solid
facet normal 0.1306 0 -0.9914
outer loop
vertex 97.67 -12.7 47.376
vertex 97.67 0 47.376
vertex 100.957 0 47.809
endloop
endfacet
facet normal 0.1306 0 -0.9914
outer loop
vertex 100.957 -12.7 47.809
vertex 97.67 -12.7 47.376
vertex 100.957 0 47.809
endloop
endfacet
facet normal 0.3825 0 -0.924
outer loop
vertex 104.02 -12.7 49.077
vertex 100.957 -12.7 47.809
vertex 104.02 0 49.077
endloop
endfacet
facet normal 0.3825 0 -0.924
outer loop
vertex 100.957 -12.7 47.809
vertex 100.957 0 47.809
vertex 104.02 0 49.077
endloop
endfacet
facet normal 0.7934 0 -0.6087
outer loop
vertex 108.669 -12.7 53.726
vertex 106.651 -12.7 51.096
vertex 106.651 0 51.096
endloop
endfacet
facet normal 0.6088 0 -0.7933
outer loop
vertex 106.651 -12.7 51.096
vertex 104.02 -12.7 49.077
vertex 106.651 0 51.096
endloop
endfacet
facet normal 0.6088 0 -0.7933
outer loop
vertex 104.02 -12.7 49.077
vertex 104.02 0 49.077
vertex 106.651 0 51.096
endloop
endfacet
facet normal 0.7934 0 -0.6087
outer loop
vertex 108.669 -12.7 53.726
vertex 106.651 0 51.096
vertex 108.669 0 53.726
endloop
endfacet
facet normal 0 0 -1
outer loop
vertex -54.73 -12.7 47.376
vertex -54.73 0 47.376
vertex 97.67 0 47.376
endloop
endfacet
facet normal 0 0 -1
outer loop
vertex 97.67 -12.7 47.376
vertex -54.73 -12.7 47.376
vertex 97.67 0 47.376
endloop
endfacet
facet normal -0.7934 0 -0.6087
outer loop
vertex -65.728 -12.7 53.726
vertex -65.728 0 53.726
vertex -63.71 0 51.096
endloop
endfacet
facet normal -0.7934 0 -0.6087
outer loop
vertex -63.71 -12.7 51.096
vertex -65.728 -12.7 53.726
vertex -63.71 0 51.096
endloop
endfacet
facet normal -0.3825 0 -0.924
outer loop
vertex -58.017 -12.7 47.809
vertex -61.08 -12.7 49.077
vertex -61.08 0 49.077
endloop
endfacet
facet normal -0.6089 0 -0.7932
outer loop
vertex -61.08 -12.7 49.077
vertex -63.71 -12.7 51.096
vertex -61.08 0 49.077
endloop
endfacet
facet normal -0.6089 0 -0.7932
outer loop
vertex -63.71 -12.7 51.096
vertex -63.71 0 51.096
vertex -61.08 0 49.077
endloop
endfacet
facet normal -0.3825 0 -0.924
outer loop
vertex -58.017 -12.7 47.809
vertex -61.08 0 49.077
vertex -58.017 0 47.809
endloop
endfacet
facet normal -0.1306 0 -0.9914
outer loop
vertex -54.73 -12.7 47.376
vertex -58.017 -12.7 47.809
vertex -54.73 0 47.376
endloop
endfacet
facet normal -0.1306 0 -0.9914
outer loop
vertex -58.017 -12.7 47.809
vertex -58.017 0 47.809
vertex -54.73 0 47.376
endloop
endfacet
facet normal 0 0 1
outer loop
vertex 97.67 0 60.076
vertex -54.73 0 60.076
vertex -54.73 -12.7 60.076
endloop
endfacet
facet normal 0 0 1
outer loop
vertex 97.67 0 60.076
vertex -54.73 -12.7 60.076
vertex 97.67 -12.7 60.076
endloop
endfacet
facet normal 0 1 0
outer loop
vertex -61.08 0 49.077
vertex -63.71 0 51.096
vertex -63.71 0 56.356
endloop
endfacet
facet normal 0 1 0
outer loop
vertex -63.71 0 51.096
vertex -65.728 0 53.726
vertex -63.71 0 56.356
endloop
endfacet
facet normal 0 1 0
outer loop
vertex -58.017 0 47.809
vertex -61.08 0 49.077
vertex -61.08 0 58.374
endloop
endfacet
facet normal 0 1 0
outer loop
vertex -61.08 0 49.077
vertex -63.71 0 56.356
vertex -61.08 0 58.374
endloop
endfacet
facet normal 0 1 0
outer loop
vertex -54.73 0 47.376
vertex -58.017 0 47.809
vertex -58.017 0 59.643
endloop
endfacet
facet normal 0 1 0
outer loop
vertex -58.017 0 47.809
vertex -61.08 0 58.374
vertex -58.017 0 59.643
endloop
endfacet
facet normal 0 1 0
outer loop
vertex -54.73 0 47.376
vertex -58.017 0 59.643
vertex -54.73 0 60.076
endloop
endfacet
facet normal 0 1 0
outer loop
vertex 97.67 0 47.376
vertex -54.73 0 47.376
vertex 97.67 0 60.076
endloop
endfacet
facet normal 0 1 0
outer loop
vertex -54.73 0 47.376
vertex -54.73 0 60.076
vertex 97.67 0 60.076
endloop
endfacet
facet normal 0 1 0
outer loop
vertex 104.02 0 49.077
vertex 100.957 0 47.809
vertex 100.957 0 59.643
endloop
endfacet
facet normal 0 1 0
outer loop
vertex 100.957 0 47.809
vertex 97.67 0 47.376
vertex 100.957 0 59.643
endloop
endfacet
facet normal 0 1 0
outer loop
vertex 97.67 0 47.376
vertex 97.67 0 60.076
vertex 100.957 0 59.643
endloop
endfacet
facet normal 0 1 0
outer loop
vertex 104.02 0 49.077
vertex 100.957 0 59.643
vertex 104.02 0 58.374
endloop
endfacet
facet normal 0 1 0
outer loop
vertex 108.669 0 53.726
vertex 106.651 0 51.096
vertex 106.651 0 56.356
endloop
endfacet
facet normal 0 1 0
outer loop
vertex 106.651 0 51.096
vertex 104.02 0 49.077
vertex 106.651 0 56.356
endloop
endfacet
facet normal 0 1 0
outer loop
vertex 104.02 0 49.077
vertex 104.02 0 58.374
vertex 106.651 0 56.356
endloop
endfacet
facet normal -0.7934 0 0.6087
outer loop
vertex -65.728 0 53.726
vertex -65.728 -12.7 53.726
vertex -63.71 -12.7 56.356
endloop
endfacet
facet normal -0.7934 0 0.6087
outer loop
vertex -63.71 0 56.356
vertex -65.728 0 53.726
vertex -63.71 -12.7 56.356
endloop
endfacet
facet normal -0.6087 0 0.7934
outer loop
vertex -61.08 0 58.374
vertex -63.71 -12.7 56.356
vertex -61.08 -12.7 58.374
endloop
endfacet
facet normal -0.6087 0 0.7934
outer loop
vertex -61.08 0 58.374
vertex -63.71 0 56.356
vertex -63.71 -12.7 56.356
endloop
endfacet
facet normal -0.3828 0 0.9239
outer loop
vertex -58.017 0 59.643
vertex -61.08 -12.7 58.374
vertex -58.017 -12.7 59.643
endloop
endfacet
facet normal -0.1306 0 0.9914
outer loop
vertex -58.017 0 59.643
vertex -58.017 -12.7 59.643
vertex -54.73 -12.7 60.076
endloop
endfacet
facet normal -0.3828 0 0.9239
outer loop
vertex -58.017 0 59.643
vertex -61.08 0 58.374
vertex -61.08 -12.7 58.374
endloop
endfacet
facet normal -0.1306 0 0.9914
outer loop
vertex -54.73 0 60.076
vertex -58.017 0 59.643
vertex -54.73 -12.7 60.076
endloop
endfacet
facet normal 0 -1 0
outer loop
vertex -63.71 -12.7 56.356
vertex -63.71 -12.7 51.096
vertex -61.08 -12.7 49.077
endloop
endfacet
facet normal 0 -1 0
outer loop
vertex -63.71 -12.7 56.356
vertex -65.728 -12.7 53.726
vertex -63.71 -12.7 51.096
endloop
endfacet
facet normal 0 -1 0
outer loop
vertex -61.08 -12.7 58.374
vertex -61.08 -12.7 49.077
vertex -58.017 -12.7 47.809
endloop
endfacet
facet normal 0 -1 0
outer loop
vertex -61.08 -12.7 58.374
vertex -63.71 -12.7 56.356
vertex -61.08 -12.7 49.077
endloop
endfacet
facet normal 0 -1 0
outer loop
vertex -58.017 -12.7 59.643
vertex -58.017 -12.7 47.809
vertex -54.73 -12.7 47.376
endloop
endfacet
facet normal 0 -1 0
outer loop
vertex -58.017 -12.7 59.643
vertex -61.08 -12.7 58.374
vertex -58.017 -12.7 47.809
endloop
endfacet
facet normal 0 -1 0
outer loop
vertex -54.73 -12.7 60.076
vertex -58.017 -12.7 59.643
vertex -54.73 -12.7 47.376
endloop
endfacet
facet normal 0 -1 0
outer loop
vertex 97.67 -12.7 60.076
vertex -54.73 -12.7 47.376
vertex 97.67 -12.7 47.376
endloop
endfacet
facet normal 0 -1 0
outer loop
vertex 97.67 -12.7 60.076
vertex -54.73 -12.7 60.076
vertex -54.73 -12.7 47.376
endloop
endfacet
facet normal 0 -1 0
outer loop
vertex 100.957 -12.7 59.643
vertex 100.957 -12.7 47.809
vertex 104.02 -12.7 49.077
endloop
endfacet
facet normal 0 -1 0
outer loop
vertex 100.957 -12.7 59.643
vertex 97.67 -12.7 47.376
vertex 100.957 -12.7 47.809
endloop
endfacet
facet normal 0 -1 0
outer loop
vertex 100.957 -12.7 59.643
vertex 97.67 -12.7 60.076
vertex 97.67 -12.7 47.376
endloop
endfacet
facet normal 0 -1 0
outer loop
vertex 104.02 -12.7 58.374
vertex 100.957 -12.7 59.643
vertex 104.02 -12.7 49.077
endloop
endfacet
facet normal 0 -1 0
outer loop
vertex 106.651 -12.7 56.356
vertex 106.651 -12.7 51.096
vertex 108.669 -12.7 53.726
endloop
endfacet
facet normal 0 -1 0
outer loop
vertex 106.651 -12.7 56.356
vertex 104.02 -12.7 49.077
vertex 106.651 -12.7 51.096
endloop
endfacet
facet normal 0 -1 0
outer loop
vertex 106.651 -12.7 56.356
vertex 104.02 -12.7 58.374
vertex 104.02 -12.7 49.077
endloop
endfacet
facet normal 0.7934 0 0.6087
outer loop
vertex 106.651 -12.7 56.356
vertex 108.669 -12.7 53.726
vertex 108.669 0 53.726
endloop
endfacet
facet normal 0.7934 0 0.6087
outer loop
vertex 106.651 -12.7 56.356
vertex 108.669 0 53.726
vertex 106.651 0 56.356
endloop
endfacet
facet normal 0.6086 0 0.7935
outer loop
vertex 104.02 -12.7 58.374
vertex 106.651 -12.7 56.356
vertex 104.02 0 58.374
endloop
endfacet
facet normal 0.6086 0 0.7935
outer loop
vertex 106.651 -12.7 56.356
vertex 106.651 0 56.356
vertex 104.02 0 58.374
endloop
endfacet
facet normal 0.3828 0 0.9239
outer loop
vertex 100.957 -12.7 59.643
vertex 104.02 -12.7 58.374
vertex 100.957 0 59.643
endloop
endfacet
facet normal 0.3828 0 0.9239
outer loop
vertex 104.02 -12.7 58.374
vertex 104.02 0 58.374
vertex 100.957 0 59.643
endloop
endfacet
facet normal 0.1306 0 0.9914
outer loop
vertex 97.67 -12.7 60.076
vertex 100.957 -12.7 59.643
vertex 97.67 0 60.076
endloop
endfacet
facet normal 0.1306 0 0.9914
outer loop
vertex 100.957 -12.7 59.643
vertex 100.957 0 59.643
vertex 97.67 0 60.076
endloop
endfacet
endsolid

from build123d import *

# Parameters (mm, degrees)
F0_W        = 177.8
F0_H        = 12.7
F1_DEPTH    = 12.7
F2_T1_DEPTH = 76.2


# Not quite as in the source:
# - a fillet or chamfer that OpenCascade refuses, or shapes differently, is made with other operations: its cross-section is extruded or revolved along the edge and cut away or added


with BuildPart() as f1:
    # F0 (on Front) → F1 (new body)
    with BuildSketch(Plane.XZ):
        with Locations((21.4704718173, 53.7259025425)):
            Rectangle(F0_W, F0_H)
    extrude(amount=F1_DEPTH)

    # F2: fillet of radius 12.7 on 4 edges, made by hand

    # F2_s2 → F2_t1 (cut)
    with BuildSketch(Plane.XZ.offset(-31.75)):
        with BuildLine():
            ThreePointArc((-67.4295281827, 47.3759025425), (-63.7097843038, 56.3561586636), (-54.7295281827, 60.0759025425))
            Line((-54.7295281827, 60.0759025425), (-67.4295281827, 60.0759025425))
            Line((-67.4295281827, 60.0759025425), (-67.4295281827, 47.3759025425))
        make_face()
        with BuildLine():
            ThreePointArc((110.3704718173, 47.3759025425), (106.6507279383, 56.3561586636), (97.6704718173, 60.0759025425))
            Line((97.6704718173, 60.0759025425), (110.3704718173, 60.0759025425))
            Line((110.3704718173, 60.0759025425), (110.3704718173, 47.3759025425))
        make_face()
        with BuildLine():
            ThreePointArc((97.6704718173, 47.3759025425), (106.6507279383, 51.0956464214), (110.3704718173, 60.0759025425))
            Line((110.3704718173, 60.0759025425), (110.3704718173, 47.3759025425))
            Line((110.3704718173, 47.3759025425), (97.6704718173, 47.3759025425))
        make_face()
        with BuildLine():
            ThreePointArc((-67.4295281827, 60.0759025425), (-63.7097843038, 51.0956464214), (-54.7295281827, 47.3759025425))
            Line((-54.7295281827, 47.3759025425), (-67.4295281827, 47.3759025425))
            Line((-67.4295281827, 47.3759025425), (-67.4295281827, 60.0759025425))
        make_face()
    extrude(amount=F2_T1_DEPTH, mode=Mode.SUBTRACT)


solid = f1.part
